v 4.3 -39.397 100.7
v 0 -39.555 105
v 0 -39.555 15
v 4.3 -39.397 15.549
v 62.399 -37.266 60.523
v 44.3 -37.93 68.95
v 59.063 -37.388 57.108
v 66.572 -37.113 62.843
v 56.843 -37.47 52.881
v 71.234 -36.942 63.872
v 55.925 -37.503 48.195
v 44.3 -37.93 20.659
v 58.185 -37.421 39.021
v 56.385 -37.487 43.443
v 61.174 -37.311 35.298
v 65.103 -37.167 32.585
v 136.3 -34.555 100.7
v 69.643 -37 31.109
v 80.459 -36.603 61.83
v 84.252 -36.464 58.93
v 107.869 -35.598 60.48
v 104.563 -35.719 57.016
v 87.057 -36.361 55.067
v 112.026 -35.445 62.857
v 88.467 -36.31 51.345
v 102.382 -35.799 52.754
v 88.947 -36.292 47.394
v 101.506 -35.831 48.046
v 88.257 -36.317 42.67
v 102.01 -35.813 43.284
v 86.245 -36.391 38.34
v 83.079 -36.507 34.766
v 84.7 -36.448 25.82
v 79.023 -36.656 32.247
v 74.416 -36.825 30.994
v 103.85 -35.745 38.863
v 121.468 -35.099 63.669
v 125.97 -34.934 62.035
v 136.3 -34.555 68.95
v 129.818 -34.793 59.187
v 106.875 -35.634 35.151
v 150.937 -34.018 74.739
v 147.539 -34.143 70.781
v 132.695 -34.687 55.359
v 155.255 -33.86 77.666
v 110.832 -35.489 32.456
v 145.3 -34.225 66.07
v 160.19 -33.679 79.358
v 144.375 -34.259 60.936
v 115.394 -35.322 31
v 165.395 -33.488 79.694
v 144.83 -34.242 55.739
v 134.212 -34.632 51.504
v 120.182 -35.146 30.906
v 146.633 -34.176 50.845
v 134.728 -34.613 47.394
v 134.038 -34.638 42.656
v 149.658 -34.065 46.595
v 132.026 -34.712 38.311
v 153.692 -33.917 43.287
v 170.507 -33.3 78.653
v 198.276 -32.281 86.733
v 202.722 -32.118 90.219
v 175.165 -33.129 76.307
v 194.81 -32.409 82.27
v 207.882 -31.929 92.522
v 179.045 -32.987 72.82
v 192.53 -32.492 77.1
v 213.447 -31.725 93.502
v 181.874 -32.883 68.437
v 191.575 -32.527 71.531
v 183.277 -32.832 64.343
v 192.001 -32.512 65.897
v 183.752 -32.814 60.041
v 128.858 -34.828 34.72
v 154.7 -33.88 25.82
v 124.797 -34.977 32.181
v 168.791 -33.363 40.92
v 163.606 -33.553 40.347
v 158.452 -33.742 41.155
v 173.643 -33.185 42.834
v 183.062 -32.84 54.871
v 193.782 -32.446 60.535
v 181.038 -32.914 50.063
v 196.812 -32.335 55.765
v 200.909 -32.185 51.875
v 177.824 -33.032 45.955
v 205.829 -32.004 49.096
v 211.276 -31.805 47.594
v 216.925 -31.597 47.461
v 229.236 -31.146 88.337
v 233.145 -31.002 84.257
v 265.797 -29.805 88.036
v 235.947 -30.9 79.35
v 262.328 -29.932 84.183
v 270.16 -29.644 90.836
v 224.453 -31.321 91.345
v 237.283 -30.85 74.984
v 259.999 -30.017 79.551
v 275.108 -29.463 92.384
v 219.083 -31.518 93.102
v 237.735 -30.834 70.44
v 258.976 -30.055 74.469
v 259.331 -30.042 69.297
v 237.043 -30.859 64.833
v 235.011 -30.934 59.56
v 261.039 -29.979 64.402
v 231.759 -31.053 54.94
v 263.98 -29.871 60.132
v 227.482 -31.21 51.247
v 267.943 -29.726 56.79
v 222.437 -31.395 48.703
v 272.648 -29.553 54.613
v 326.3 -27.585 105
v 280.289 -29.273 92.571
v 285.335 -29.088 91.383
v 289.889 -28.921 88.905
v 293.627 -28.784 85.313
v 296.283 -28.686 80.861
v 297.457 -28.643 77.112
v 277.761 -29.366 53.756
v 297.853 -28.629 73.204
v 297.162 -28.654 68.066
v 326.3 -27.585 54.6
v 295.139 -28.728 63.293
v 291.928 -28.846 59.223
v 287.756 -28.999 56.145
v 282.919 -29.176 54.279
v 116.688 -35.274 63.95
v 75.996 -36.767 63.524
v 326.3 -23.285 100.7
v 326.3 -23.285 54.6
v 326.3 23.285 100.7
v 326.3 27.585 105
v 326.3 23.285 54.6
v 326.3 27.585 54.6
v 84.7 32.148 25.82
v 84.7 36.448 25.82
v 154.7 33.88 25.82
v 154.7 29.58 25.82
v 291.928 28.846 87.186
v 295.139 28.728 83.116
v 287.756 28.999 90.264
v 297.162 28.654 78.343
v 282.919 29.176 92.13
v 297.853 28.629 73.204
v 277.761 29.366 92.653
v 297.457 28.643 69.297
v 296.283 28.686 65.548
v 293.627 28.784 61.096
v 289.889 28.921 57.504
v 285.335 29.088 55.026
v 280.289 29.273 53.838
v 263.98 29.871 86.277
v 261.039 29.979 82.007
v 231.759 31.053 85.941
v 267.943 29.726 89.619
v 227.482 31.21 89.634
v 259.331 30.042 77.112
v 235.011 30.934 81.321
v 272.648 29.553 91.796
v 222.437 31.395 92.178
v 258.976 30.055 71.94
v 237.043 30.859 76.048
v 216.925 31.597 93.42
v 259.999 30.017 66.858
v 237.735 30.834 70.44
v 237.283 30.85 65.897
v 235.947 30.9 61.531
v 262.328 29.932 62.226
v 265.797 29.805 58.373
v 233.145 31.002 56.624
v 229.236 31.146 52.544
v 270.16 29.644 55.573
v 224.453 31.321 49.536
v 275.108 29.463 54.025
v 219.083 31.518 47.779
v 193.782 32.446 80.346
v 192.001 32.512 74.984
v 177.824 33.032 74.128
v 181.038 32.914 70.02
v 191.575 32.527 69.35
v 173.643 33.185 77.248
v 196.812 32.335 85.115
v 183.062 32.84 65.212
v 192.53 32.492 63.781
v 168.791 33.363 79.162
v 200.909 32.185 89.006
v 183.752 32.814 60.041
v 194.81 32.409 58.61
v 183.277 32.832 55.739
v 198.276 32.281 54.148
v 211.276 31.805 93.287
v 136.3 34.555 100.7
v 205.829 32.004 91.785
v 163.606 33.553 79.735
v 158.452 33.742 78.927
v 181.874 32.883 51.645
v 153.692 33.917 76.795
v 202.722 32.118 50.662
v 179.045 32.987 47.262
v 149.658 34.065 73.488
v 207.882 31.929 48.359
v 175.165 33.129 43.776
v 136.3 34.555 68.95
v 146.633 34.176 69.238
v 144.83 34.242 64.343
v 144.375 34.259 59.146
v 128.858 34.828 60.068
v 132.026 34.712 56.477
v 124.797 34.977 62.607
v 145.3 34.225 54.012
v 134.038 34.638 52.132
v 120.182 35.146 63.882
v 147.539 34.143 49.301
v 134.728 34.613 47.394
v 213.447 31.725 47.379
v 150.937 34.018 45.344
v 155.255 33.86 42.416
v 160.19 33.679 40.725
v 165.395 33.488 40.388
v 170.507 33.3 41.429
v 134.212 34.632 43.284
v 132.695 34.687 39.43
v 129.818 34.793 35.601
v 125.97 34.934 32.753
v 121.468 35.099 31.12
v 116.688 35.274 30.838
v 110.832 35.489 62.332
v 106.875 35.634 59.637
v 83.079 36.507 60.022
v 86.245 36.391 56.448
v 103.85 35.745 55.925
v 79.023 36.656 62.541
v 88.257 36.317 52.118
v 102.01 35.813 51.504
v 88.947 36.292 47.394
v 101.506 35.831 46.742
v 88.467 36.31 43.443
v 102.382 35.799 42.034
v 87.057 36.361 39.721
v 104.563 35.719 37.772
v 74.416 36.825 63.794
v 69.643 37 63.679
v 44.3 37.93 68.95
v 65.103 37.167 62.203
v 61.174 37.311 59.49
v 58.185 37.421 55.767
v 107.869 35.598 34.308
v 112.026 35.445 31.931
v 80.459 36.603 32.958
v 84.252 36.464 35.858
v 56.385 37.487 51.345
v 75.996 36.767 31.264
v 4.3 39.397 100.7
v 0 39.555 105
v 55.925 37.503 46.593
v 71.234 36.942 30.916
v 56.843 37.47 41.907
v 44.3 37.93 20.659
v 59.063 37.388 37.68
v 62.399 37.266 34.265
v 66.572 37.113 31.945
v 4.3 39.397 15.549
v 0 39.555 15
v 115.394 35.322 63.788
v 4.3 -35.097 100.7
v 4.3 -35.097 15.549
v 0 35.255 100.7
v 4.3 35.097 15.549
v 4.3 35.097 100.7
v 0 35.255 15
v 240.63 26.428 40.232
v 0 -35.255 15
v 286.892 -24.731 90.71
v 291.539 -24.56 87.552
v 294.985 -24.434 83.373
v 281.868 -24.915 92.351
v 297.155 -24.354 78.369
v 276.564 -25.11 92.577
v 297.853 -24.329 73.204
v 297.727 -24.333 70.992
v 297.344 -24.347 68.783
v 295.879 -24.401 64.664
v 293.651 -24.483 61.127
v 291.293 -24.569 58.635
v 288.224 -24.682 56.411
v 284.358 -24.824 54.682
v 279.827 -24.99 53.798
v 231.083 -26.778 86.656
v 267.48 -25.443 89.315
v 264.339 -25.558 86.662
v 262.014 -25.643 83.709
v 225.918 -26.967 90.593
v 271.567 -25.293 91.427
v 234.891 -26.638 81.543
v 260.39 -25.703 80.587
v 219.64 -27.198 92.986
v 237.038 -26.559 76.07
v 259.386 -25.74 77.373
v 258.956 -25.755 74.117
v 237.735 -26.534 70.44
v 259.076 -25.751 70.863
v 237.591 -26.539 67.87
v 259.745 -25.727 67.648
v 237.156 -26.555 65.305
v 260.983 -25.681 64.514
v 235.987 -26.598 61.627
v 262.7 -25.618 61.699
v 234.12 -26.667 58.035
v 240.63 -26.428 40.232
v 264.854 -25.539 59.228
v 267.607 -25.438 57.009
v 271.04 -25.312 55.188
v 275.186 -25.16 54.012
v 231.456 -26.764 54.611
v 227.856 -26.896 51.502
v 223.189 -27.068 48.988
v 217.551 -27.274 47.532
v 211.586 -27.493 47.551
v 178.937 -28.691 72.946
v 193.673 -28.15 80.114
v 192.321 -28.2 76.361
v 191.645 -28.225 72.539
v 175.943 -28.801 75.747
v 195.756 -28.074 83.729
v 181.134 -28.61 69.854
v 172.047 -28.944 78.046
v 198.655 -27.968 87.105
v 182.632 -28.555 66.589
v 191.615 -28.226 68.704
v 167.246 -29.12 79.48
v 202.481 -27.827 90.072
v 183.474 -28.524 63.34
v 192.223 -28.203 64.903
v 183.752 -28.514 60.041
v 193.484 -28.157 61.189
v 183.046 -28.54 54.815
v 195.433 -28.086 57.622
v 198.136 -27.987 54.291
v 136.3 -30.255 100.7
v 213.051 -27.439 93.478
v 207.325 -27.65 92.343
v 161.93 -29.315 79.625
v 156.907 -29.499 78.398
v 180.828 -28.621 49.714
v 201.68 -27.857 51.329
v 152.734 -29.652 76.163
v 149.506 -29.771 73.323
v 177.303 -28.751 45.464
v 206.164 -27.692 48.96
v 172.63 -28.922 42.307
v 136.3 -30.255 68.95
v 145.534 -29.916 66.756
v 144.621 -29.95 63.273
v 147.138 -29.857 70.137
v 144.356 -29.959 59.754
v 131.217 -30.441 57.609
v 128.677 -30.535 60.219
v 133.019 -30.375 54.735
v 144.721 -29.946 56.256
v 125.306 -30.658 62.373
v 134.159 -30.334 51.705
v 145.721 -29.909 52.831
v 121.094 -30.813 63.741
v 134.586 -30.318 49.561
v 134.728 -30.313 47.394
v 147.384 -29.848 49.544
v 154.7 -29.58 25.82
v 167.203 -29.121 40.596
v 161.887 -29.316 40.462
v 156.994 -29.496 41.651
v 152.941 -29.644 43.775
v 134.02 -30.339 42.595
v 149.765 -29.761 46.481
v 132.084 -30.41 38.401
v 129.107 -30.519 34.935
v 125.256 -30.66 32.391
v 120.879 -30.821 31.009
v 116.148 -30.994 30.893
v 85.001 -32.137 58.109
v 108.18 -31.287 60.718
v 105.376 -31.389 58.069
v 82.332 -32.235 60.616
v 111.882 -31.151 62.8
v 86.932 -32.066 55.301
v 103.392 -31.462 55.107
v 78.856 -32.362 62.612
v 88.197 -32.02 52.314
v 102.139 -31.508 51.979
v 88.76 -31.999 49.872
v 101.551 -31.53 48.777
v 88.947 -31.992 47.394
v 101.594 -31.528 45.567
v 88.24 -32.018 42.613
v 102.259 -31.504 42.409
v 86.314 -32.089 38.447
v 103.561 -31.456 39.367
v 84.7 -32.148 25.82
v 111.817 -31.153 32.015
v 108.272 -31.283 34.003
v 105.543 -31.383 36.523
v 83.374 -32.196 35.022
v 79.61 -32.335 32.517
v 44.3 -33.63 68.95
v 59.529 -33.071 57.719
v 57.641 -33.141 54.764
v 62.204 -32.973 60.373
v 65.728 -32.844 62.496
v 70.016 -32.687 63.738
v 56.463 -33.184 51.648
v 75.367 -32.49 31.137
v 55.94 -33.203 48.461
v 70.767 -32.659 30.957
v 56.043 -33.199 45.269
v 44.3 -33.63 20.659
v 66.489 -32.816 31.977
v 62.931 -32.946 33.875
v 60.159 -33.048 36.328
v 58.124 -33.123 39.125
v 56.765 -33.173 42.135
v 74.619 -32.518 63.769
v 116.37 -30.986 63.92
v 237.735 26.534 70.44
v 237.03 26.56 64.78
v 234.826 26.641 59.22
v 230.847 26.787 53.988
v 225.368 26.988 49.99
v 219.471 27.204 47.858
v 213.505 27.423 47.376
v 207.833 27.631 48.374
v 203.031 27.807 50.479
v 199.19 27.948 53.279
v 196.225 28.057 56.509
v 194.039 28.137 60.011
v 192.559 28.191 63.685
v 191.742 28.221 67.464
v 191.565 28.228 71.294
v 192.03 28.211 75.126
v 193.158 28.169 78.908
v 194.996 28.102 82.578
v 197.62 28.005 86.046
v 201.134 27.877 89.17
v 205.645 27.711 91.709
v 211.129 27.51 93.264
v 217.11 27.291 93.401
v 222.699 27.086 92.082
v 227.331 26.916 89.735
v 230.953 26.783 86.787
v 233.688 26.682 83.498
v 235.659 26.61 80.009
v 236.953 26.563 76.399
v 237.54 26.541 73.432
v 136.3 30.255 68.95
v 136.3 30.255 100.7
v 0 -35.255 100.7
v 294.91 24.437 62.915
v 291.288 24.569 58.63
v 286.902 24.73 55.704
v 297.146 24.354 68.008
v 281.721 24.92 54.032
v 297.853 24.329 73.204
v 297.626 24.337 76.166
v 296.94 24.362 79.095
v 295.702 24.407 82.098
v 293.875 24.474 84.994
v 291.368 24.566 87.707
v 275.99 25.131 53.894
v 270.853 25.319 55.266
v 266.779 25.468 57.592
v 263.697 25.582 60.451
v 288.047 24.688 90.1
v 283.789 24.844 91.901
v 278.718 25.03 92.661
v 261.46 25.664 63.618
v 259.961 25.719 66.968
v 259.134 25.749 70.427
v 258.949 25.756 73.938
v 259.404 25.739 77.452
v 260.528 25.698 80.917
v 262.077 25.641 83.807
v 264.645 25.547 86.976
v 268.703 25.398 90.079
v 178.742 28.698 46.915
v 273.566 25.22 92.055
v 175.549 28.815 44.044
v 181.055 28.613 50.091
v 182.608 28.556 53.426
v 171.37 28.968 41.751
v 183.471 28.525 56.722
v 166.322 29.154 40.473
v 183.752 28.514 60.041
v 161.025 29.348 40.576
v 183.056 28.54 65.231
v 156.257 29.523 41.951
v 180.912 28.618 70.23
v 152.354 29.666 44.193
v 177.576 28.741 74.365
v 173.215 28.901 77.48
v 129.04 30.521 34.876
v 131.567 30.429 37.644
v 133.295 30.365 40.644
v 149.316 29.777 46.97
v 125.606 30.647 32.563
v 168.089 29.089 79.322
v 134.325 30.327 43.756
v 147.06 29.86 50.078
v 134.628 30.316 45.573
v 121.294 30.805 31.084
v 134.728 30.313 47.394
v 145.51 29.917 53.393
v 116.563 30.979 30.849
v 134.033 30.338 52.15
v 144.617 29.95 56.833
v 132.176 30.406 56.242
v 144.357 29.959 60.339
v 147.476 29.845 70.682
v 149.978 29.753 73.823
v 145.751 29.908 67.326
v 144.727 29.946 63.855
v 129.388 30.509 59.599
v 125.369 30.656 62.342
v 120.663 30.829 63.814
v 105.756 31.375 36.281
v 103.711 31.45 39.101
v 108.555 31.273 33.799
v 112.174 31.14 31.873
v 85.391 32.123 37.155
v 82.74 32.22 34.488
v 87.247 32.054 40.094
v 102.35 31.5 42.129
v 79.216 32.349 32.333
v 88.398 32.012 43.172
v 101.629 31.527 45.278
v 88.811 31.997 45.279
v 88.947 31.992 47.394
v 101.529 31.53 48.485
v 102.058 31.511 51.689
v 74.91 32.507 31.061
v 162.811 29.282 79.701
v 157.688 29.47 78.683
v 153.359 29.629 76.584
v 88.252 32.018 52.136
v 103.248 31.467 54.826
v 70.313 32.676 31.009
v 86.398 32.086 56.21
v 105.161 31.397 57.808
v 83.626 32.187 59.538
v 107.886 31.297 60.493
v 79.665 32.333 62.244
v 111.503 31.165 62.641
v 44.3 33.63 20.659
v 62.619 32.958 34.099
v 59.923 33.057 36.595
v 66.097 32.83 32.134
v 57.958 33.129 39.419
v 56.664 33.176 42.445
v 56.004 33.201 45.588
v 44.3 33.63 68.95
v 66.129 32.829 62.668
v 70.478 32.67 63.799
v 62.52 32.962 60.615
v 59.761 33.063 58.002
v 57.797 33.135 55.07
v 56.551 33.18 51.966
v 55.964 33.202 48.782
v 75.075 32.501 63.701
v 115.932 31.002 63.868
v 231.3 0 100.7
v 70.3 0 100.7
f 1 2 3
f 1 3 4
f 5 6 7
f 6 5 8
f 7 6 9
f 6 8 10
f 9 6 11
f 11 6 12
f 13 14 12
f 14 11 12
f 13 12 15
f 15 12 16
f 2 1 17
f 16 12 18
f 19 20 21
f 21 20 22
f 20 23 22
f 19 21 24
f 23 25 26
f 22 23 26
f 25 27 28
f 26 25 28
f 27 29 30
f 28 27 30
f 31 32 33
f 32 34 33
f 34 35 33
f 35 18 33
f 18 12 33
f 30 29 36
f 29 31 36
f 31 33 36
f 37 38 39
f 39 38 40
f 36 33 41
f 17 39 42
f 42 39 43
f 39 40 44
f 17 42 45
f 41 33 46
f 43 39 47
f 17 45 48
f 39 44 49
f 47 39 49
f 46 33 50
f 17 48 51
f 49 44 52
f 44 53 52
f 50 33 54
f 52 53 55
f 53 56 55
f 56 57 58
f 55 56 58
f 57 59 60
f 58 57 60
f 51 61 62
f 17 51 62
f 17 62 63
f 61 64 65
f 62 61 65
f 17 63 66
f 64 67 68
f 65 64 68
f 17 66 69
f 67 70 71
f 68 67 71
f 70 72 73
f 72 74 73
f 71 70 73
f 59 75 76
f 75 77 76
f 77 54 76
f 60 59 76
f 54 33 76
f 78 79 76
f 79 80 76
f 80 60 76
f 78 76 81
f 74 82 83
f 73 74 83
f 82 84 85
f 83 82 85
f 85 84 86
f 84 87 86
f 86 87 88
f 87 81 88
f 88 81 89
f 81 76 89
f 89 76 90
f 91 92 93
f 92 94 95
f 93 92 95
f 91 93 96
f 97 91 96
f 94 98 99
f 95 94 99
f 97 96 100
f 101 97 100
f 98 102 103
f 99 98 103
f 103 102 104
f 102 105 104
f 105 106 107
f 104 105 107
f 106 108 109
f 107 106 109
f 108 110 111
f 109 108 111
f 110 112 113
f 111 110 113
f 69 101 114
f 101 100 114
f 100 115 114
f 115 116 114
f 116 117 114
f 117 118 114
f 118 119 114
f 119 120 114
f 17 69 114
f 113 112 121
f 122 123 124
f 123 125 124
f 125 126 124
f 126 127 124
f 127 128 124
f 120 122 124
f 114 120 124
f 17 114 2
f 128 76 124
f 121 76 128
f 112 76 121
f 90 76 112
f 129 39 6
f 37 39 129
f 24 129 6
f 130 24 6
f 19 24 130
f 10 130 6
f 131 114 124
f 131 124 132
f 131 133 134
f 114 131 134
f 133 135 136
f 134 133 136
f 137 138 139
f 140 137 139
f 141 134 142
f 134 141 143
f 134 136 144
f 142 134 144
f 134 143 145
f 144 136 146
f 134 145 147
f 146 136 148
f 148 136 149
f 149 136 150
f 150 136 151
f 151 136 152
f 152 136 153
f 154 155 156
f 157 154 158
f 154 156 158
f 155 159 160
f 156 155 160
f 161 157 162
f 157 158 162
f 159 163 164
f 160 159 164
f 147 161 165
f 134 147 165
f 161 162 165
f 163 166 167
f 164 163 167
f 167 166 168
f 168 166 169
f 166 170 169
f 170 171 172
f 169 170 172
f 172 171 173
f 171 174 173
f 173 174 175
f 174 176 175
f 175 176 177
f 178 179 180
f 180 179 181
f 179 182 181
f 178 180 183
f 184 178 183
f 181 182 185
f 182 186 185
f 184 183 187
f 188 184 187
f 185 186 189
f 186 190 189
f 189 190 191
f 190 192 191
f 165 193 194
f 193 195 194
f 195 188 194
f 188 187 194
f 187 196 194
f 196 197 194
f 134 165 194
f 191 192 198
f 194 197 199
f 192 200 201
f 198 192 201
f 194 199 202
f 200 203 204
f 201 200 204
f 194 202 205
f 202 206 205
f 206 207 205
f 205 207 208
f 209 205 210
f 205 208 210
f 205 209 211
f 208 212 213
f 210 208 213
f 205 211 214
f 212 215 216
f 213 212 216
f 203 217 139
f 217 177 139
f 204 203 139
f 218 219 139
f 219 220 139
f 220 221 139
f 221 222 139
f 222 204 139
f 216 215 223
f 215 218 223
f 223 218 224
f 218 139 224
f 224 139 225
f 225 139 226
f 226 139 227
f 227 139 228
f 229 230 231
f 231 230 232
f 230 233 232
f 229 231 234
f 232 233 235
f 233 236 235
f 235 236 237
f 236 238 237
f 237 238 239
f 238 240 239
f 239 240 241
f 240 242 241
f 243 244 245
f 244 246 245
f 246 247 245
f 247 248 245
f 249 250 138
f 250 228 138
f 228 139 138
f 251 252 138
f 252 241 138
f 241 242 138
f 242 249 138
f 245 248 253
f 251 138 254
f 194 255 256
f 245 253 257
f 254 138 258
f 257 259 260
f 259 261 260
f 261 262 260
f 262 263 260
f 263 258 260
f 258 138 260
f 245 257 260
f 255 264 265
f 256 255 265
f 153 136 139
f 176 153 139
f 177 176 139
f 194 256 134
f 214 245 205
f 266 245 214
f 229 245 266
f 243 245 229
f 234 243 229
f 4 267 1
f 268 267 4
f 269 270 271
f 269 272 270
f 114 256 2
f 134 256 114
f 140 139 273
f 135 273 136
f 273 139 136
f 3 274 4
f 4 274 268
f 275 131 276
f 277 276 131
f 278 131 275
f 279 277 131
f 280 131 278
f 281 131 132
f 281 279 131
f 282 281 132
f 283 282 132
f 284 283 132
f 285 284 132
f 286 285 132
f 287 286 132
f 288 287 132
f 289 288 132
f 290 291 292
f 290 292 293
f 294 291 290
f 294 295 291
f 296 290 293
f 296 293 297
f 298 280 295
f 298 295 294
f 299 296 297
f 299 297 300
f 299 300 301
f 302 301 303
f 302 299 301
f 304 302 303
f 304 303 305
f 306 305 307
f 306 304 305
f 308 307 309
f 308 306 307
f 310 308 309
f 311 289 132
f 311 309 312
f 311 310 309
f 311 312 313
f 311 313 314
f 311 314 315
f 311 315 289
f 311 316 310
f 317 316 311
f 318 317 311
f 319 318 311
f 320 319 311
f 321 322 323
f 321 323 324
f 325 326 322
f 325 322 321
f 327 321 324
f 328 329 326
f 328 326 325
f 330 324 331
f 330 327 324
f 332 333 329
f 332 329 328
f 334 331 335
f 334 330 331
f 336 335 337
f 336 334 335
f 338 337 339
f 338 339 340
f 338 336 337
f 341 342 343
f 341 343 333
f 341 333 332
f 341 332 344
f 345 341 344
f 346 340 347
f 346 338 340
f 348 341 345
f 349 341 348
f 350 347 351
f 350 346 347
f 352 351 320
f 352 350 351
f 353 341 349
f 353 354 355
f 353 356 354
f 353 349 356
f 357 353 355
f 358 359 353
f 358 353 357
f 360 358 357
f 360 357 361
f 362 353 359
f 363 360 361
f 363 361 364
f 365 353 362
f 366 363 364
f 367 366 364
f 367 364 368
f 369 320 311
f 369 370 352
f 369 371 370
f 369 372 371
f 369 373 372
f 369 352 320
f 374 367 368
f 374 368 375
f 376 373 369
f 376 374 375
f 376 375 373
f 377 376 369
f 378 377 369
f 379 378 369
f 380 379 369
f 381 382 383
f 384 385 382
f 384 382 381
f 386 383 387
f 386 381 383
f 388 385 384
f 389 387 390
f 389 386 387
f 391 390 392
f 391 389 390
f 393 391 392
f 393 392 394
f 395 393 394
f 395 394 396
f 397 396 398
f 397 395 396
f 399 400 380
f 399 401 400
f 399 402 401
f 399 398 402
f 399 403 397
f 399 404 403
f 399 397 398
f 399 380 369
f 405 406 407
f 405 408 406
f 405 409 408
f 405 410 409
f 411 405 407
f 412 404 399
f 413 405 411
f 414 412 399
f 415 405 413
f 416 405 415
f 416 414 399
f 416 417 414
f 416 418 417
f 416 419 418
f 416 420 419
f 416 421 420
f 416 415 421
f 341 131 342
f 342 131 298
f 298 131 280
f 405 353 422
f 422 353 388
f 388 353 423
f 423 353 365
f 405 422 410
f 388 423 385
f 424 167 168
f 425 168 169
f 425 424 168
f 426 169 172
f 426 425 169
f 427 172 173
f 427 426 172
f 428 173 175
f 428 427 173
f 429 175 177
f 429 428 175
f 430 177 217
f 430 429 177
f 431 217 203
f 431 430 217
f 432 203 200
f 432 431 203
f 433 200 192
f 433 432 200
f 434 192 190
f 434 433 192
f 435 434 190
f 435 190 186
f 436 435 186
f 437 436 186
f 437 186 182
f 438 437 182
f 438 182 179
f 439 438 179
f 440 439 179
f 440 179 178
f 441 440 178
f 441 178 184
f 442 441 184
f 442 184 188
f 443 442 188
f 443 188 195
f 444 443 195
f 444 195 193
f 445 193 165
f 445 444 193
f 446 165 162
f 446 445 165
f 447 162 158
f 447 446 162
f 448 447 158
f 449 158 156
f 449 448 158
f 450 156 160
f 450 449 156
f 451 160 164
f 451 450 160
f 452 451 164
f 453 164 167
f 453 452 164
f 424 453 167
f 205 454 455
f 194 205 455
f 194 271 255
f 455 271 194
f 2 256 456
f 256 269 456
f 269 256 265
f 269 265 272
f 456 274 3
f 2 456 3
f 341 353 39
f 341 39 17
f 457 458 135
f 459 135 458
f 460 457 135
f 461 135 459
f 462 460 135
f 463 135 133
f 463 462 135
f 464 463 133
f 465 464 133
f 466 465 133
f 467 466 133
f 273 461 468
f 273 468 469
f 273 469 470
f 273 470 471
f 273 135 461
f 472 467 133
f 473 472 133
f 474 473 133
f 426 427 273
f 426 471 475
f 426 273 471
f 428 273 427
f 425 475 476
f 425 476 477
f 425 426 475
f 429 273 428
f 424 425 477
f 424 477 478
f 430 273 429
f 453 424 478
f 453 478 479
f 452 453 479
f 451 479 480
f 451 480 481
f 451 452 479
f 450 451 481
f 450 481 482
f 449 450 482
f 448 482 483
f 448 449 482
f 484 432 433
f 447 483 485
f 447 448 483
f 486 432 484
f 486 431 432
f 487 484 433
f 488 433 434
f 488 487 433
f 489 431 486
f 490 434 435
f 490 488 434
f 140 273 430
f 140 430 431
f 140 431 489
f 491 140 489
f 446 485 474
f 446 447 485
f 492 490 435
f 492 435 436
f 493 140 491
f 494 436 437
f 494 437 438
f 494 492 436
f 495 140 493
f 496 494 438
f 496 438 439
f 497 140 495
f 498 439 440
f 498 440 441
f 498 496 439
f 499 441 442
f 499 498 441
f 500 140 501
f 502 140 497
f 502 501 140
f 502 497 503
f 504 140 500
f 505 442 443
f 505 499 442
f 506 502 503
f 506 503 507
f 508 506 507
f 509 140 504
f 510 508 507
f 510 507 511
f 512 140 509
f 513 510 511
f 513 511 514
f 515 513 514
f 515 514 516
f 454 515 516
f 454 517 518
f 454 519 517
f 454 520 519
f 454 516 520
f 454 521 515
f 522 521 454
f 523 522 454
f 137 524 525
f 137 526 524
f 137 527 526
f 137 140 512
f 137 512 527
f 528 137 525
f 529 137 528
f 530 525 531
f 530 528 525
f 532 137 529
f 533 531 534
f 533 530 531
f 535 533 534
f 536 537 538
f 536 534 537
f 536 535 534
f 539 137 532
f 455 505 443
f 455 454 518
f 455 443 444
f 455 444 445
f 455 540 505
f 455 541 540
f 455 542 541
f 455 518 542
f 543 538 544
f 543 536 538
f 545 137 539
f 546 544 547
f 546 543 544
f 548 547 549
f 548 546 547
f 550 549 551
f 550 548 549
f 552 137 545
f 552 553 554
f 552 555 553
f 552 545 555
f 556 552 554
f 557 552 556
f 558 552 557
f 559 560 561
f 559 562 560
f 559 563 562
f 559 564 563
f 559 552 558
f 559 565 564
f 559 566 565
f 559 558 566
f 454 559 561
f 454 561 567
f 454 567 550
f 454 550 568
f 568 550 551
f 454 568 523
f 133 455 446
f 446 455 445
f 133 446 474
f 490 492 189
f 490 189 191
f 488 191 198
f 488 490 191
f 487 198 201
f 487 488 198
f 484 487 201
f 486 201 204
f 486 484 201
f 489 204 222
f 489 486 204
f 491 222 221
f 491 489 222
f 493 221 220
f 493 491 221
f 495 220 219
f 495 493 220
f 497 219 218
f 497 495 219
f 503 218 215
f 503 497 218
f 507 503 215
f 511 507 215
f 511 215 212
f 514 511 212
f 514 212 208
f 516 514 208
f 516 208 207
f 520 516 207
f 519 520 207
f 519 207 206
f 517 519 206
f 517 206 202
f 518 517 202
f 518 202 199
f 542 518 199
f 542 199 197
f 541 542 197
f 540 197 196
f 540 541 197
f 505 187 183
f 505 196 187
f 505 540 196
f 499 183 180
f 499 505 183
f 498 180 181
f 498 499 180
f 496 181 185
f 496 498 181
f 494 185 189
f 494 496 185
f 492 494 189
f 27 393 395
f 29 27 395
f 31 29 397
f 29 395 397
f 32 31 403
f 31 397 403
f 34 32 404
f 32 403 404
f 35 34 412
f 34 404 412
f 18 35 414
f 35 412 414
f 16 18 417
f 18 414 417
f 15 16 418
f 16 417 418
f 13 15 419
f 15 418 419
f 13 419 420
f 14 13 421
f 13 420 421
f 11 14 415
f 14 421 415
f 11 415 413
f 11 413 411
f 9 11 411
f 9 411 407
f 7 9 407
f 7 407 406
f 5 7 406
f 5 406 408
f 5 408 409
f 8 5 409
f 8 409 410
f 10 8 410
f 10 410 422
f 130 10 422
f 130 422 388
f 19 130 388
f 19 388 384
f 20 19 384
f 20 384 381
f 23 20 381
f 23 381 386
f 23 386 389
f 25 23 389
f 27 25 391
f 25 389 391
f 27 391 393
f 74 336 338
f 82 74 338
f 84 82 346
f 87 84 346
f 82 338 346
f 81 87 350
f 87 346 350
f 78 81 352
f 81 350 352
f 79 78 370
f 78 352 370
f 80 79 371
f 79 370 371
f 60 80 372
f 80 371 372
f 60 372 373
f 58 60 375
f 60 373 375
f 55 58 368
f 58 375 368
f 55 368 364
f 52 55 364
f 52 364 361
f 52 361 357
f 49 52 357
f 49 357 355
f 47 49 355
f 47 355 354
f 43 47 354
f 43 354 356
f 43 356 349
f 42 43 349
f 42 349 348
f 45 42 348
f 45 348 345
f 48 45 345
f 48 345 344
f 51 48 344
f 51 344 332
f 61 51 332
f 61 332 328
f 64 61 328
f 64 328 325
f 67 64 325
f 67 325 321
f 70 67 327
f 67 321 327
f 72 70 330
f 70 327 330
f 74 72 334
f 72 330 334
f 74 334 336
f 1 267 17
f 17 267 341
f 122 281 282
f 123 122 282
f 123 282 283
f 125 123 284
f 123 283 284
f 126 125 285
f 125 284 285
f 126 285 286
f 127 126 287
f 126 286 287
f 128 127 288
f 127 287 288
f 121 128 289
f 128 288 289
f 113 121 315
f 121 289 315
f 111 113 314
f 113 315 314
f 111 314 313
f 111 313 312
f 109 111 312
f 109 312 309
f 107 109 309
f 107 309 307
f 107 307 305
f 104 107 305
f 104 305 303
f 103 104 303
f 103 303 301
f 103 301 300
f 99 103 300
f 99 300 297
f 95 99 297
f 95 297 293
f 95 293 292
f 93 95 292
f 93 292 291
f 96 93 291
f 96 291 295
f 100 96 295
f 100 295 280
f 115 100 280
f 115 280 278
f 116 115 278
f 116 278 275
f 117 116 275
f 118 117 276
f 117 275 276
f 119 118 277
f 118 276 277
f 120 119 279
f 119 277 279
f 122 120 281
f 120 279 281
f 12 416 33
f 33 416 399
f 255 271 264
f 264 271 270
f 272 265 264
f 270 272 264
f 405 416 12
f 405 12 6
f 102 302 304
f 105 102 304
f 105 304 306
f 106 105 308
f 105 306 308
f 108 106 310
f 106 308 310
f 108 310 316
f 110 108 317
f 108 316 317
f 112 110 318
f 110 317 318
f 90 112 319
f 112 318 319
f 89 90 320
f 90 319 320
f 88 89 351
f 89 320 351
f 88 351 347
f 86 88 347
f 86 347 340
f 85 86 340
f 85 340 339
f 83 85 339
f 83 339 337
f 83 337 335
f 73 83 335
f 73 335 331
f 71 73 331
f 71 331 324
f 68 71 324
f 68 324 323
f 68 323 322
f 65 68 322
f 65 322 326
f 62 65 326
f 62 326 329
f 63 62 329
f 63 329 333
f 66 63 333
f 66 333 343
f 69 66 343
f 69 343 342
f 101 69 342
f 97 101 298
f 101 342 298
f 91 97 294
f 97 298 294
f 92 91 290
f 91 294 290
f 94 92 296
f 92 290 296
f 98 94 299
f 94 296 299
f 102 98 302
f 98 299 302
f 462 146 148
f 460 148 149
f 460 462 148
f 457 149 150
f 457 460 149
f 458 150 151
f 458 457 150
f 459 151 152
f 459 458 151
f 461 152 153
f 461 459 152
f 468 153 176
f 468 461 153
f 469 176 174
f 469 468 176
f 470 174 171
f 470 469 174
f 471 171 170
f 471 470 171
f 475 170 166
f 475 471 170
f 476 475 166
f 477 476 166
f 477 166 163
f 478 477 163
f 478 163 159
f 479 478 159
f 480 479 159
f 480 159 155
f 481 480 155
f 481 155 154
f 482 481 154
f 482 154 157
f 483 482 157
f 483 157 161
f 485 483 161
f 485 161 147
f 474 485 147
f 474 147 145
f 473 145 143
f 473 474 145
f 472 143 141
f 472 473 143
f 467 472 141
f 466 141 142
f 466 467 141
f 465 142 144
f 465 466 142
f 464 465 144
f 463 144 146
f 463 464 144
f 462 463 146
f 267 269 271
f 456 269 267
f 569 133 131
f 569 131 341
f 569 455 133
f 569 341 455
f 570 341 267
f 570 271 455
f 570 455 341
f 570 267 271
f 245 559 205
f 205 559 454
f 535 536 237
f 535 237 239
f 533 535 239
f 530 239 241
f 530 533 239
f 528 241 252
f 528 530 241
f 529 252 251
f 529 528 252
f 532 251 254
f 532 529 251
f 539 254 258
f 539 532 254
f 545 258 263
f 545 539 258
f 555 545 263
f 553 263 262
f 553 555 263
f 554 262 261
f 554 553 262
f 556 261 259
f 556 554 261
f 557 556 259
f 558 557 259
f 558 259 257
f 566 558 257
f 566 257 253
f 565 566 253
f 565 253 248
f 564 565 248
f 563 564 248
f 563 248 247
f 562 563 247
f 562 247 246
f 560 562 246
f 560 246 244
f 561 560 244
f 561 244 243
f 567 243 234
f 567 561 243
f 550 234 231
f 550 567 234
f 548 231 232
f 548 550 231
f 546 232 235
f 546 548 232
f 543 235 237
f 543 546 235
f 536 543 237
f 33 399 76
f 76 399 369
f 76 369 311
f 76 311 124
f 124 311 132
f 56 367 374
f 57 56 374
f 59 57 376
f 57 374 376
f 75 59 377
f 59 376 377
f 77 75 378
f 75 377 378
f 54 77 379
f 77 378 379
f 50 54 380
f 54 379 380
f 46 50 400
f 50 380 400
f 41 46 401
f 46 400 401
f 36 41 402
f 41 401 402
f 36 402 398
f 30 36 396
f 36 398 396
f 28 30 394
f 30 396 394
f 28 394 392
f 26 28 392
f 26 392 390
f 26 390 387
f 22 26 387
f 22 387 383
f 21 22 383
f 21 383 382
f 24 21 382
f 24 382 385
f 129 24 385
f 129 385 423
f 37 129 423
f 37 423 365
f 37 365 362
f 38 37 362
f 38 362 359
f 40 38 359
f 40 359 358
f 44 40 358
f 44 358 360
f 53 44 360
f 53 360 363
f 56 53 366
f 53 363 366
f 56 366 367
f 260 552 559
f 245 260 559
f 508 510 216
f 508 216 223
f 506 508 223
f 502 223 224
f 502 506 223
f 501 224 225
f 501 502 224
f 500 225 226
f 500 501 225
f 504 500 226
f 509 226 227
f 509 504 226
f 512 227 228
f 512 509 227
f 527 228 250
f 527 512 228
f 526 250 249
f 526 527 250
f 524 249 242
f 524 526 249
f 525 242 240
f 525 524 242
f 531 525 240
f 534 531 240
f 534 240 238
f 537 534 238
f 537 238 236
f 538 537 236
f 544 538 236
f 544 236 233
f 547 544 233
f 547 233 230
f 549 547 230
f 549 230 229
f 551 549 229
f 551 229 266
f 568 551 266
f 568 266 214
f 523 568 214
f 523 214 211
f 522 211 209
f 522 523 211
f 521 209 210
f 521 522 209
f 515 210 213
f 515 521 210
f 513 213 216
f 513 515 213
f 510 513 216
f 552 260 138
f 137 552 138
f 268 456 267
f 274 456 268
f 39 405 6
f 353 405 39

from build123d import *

# Parameters (mm, degrees)
BOSS_EXTRUDE1_DEPTH     = 105
CUT_EXTRUDE1_DEPTH      = 105.1
CUT_EXTRUDE1_DEPTH_BACK = 105.1
CUT_EXTRUDE4_DEPTH      = 346.052587439
CUT_EXTRUDE4_DEPTH_BACK = 346.052587439
SKETCH8_R               = 23.092737718
SKETCH8_R_2             = 19.459118311
CUT_EXTRUDE5_DEPTH      = 346.052587439
CUT_EXTRUDE5_DEPTH_BACK = 346.052587439
SKETCH9_R               = 16.617220832
SKETCH9_R_2             = 16.520725145
SKETCH9_R_3             = 19.698995854


with BuildPart() as part:
    # Sketch1 → Boss-Extrude1 (new body)
    with BuildSketch(Plane.XY):
        Polygon((0, 39.555), (0, -39.555), (326.3, -27.585), (326.3, 27.585), align=None)
    extrude(amount=BOSS_EXTRUDE1_DEPTH)

    # Sketch3 → Cut-Extrude1 (cut, two sides: drawn at the far end of the back side and taken through both)
    with BuildSketch(Plane(origin=(0, 0, 0), x_dir=(1, 0, 0), z_dir=(0, 1, 0)).offset(-CUT_EXTRUDE1_DEPTH_BACK)):
        Polygon((0, -15), (84.7, -25.82), (154.7, -25.82), (326.3, -54.6), (326.3, 36.079011671), (0, 41.113860107), align=None)
    extrude(amount=CUT_EXTRUDE1_DEPTH + CUT_EXTRUDE1_DEPTH_BACK, mode=Mode.SUBTRACT)

    # Sketch4 → Cut-Loft1 section 0
    with BuildSketch(Plane(origin=(326.3, 0, 0), x_dir=(0, 0, -1), z_dir=(1, 0, 0))):
        with BuildLine():
            Line((-100.7, 23.285), (-22.554524003, 23.285))
            Line((-22.554524003, 23.285), (-22.554524003, -23.285))
            Line((-22.554524003, -23.285), (-100.7, -23.285))
            Line((-100.7, -23.285), (-100.7, 23.285))
        make_face()
    # Sketch5 → Cut-Loft1 section 1
    with BuildSketch(Plane.ZY):
        with BuildLine():
            Line((-10.956527507, 35.255), (100.7, 35.255))
            Line((100.7, 35.255), (100.7, -35.255))
            Line((100.7, -35.255), (-10.956527507, -35.255))
            Line((-10.956527507, -35.255), (-10.956527507, 35.255))
        make_face()
    loft(mode=Mode.SUBTRACT)

    # Sketch8 → Cut-Extrude4 (cut, two sides: drawn at the far end of the back side and taken through both)
    with BuildSketch(Plane(origin=(0, 0, 0), x_dir=(1, 0, 0), z_dir=(0, 1, 0)).offset(-CUT_EXTRUDE4_DEPTH_BACK)):
        with Locations((214.641912664, -70.440417493)):
            Circle(SKETCH8_R)
        with Locations((278.393804533, -73.204497515)):
            Circle(SKETCH8_R_2)
    extrude(amount=CUT_EXTRUDE4_DEPTH + CUT_EXTRUDE4_DEPTH_BACK, mode=Mode.SUBTRACT)

    # Sketch9 → Cut-Extrude5 (cut, two sides: drawn at the far end of the back side and taken through both)
    with BuildSketch(Plane(origin=(0, 0, 0), x_dir=(1, 0, 0), z_dir=(0, 1, 0)).offset(-CUT_EXTRUDE5_DEPTH_BACK)):
        with Locations((118.110707971, -47.394014977)):
            Circle(SKETCH9_R)
        with Locations((72.426153878, -47.394014977)):
            Circle(SKETCH9_R_2)
        with Locations((164.053366889, -60.04115142)):
            Circle(SKETCH9_R_3)
        Polygon((4.3, -6.491738735), (44.3, -6.491738735), (44.3, -68.95), (136.3, -68.95), (136.3, -100.7), (44.3, -100.7), (4.3, -100.7), align=None)
    extrude(amount=CUT_EXTRUDE5_DEPTH + CUT_EXTRUDE5_DEPTH_BACK, mode=Mode.SUBTRACT)


solid = part.part
